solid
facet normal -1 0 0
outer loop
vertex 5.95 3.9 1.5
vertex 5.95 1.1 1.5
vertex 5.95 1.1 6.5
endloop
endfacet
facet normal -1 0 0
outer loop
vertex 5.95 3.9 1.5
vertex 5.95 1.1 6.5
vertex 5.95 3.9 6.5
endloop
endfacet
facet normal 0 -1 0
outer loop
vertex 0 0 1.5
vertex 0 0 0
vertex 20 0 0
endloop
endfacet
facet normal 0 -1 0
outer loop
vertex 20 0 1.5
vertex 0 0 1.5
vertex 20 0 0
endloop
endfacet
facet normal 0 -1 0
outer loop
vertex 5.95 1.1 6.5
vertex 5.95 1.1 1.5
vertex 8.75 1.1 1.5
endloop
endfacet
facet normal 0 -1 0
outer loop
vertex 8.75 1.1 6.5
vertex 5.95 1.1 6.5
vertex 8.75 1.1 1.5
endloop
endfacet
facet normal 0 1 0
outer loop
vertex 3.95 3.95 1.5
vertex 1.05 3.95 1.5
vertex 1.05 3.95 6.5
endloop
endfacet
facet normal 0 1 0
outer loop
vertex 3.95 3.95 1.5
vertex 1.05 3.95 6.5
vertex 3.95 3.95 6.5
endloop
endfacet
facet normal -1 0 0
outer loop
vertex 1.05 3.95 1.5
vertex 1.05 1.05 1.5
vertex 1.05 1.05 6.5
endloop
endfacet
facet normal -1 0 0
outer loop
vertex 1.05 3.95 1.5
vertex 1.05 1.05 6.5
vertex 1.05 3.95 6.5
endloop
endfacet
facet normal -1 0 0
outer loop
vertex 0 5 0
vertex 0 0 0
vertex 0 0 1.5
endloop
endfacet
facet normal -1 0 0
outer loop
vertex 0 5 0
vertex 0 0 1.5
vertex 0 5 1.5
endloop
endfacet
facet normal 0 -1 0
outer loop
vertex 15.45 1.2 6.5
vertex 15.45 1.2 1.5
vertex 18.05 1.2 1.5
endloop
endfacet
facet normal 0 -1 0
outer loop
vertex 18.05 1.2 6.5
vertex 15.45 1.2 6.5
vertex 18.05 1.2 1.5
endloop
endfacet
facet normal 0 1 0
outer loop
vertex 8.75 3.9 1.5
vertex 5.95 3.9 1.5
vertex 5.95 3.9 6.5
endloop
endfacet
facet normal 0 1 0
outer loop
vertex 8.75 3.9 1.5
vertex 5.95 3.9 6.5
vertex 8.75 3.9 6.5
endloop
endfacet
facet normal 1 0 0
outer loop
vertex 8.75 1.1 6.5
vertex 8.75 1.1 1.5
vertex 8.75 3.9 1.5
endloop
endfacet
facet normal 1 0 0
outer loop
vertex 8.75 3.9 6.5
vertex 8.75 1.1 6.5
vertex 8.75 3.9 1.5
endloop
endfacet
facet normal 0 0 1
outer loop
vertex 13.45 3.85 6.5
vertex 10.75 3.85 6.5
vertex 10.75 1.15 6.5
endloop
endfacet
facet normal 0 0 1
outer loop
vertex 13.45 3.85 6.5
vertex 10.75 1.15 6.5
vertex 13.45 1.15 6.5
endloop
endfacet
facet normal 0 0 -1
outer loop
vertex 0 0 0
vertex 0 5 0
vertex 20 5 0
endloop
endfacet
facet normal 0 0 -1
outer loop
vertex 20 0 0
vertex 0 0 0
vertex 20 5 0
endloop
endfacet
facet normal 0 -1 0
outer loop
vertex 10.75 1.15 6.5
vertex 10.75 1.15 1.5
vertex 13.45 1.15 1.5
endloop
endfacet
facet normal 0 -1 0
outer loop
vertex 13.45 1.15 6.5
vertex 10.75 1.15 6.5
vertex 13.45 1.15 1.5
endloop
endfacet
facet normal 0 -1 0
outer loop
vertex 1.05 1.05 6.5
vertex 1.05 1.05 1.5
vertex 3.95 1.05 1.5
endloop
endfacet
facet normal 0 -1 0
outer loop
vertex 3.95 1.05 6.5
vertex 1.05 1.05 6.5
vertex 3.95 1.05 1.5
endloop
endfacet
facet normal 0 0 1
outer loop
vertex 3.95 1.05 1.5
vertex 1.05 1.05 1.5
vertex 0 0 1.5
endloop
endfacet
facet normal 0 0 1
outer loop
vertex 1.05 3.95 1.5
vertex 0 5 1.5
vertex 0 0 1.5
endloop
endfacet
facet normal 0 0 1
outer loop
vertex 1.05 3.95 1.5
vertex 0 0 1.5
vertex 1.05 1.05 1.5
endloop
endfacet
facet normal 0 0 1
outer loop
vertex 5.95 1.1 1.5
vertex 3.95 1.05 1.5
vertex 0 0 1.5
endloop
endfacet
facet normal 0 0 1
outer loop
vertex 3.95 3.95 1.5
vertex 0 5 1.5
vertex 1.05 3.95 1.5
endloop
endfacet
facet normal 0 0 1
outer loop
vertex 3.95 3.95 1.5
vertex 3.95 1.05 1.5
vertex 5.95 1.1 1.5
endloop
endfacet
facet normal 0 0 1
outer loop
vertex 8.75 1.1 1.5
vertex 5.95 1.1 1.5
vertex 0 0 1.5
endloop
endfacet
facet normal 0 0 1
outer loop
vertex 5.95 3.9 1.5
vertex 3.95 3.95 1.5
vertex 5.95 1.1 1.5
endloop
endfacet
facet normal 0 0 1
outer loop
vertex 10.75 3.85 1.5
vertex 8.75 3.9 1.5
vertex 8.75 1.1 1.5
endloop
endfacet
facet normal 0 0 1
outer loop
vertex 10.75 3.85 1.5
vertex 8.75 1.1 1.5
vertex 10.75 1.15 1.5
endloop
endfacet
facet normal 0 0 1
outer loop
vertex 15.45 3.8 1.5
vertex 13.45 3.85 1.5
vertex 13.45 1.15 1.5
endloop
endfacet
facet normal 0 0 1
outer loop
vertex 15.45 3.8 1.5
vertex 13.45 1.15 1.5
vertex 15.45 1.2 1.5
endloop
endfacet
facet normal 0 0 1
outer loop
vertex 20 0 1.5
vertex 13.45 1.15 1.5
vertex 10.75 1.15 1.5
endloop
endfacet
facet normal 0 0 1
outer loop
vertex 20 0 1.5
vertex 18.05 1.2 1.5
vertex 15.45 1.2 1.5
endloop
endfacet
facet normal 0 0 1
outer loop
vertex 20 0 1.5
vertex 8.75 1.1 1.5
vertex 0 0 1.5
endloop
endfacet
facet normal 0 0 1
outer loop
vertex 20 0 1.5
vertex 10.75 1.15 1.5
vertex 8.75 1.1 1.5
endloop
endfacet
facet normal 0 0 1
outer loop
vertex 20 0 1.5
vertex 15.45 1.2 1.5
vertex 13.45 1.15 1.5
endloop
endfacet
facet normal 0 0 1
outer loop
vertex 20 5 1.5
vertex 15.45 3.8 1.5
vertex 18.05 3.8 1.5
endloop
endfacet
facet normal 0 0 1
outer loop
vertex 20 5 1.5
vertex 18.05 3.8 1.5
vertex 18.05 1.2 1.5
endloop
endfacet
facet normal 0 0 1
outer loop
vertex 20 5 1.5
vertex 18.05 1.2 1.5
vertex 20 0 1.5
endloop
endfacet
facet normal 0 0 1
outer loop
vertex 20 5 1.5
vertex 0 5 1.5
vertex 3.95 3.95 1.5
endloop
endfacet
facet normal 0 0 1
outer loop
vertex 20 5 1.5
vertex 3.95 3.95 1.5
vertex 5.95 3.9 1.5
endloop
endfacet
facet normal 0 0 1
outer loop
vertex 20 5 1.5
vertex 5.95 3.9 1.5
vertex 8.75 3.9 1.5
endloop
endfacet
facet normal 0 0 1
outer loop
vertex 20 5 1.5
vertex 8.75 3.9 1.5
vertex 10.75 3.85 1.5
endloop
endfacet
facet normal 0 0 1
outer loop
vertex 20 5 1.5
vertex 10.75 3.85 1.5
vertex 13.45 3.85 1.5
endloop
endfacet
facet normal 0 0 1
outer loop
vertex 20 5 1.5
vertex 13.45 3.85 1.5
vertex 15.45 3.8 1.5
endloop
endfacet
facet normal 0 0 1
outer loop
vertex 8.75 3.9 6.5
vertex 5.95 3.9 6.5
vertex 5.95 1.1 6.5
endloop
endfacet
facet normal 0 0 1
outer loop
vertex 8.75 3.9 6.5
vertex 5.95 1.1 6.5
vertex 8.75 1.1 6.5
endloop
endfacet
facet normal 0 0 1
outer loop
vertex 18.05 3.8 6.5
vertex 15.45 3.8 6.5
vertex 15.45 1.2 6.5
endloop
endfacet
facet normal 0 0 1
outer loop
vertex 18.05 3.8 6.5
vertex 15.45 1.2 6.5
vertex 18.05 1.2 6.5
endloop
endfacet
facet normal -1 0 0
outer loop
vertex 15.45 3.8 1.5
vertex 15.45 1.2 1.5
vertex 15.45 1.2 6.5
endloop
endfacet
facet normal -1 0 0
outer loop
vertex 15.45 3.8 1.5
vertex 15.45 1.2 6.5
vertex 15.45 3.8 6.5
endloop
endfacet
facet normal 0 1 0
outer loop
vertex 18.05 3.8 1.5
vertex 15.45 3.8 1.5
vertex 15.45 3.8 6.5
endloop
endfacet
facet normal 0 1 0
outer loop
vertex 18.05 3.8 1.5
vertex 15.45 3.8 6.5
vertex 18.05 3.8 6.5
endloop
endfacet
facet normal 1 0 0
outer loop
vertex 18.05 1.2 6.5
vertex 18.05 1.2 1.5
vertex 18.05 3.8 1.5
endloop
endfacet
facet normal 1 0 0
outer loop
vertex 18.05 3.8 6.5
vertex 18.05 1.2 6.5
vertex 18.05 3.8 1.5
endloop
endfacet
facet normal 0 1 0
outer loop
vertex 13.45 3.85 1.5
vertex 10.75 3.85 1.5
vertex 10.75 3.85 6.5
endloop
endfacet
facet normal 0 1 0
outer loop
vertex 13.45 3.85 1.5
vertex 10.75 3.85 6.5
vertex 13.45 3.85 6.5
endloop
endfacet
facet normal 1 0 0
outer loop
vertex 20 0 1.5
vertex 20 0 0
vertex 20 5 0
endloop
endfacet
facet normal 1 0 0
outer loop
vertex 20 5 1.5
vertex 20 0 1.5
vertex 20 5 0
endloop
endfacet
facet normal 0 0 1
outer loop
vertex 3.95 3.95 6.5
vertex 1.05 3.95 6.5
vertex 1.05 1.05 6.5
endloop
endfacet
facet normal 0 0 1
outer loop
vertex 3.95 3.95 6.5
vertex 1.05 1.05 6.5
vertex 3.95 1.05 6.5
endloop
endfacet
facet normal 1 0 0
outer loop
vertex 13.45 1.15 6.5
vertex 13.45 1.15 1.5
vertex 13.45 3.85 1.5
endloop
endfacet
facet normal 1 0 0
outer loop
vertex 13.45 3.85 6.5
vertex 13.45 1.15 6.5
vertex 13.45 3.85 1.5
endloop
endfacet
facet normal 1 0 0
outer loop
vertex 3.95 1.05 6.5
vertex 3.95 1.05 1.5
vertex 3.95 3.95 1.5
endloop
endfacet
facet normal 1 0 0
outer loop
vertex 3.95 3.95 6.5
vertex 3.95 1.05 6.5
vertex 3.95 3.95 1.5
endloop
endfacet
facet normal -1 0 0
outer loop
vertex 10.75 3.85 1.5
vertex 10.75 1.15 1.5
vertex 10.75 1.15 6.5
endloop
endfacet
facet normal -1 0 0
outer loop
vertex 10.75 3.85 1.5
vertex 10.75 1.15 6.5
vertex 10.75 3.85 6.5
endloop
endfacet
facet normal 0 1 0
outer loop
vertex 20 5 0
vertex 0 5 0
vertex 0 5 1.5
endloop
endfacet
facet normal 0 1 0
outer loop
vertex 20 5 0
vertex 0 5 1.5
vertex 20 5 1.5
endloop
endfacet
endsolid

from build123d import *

# Parameters (mm, degrees)
SKETCH1_W           = 20
SKETCH1_H           = 5
BOSS_EXTRUDE1_DEPTH = 1.5
SKETCH2_W           = 2.9
SKETCH2_H           = 2.9
SKETCH2_W_2         = 2.8
SKETCH2_H_2         = 2.8
SKETCH2_W_3         = 2.7
SKETCH2_H_3         = 2.7
SKETCH2_W_4         = 2.6
SKETCH2_H_4         = 2.6
BOSS_EXTRUDE2_DEPTH = 5


with BuildPart() as part:
    # Sketch1 → Boss-Extrude1 (new body)
    with BuildSketch(Plane.XY):
        with Locations((10, 2.5)):
            Rectangle(SKETCH1_W, SKETCH1_H)
    extrude(amount=BOSS_EXTRUDE1_DEPTH)

    # Sketch2 → Boss-Extrude2 (add)
    with BuildSketch(Plane.XY.offset(1.5)):
        with Locations((2.5, 2.5)):
            Rectangle(SKETCH2_W, SKETCH2_H)
        with Locations((7.35, 2.5)):
            Rectangle(SKETCH2_W_2, SKETCH2_H_2)
        with Locations((12.1, 2.5)):
            Rectangle(SKETCH2_W_3, SKETCH2_H_3)
        with Locations((16.75, 2.5)):
            Rectangle(SKETCH2_W_4, SKETCH2_H_4)
    extrude(amount=BOSS_EXTRUDE2_DEPTH)


solid = part.part
